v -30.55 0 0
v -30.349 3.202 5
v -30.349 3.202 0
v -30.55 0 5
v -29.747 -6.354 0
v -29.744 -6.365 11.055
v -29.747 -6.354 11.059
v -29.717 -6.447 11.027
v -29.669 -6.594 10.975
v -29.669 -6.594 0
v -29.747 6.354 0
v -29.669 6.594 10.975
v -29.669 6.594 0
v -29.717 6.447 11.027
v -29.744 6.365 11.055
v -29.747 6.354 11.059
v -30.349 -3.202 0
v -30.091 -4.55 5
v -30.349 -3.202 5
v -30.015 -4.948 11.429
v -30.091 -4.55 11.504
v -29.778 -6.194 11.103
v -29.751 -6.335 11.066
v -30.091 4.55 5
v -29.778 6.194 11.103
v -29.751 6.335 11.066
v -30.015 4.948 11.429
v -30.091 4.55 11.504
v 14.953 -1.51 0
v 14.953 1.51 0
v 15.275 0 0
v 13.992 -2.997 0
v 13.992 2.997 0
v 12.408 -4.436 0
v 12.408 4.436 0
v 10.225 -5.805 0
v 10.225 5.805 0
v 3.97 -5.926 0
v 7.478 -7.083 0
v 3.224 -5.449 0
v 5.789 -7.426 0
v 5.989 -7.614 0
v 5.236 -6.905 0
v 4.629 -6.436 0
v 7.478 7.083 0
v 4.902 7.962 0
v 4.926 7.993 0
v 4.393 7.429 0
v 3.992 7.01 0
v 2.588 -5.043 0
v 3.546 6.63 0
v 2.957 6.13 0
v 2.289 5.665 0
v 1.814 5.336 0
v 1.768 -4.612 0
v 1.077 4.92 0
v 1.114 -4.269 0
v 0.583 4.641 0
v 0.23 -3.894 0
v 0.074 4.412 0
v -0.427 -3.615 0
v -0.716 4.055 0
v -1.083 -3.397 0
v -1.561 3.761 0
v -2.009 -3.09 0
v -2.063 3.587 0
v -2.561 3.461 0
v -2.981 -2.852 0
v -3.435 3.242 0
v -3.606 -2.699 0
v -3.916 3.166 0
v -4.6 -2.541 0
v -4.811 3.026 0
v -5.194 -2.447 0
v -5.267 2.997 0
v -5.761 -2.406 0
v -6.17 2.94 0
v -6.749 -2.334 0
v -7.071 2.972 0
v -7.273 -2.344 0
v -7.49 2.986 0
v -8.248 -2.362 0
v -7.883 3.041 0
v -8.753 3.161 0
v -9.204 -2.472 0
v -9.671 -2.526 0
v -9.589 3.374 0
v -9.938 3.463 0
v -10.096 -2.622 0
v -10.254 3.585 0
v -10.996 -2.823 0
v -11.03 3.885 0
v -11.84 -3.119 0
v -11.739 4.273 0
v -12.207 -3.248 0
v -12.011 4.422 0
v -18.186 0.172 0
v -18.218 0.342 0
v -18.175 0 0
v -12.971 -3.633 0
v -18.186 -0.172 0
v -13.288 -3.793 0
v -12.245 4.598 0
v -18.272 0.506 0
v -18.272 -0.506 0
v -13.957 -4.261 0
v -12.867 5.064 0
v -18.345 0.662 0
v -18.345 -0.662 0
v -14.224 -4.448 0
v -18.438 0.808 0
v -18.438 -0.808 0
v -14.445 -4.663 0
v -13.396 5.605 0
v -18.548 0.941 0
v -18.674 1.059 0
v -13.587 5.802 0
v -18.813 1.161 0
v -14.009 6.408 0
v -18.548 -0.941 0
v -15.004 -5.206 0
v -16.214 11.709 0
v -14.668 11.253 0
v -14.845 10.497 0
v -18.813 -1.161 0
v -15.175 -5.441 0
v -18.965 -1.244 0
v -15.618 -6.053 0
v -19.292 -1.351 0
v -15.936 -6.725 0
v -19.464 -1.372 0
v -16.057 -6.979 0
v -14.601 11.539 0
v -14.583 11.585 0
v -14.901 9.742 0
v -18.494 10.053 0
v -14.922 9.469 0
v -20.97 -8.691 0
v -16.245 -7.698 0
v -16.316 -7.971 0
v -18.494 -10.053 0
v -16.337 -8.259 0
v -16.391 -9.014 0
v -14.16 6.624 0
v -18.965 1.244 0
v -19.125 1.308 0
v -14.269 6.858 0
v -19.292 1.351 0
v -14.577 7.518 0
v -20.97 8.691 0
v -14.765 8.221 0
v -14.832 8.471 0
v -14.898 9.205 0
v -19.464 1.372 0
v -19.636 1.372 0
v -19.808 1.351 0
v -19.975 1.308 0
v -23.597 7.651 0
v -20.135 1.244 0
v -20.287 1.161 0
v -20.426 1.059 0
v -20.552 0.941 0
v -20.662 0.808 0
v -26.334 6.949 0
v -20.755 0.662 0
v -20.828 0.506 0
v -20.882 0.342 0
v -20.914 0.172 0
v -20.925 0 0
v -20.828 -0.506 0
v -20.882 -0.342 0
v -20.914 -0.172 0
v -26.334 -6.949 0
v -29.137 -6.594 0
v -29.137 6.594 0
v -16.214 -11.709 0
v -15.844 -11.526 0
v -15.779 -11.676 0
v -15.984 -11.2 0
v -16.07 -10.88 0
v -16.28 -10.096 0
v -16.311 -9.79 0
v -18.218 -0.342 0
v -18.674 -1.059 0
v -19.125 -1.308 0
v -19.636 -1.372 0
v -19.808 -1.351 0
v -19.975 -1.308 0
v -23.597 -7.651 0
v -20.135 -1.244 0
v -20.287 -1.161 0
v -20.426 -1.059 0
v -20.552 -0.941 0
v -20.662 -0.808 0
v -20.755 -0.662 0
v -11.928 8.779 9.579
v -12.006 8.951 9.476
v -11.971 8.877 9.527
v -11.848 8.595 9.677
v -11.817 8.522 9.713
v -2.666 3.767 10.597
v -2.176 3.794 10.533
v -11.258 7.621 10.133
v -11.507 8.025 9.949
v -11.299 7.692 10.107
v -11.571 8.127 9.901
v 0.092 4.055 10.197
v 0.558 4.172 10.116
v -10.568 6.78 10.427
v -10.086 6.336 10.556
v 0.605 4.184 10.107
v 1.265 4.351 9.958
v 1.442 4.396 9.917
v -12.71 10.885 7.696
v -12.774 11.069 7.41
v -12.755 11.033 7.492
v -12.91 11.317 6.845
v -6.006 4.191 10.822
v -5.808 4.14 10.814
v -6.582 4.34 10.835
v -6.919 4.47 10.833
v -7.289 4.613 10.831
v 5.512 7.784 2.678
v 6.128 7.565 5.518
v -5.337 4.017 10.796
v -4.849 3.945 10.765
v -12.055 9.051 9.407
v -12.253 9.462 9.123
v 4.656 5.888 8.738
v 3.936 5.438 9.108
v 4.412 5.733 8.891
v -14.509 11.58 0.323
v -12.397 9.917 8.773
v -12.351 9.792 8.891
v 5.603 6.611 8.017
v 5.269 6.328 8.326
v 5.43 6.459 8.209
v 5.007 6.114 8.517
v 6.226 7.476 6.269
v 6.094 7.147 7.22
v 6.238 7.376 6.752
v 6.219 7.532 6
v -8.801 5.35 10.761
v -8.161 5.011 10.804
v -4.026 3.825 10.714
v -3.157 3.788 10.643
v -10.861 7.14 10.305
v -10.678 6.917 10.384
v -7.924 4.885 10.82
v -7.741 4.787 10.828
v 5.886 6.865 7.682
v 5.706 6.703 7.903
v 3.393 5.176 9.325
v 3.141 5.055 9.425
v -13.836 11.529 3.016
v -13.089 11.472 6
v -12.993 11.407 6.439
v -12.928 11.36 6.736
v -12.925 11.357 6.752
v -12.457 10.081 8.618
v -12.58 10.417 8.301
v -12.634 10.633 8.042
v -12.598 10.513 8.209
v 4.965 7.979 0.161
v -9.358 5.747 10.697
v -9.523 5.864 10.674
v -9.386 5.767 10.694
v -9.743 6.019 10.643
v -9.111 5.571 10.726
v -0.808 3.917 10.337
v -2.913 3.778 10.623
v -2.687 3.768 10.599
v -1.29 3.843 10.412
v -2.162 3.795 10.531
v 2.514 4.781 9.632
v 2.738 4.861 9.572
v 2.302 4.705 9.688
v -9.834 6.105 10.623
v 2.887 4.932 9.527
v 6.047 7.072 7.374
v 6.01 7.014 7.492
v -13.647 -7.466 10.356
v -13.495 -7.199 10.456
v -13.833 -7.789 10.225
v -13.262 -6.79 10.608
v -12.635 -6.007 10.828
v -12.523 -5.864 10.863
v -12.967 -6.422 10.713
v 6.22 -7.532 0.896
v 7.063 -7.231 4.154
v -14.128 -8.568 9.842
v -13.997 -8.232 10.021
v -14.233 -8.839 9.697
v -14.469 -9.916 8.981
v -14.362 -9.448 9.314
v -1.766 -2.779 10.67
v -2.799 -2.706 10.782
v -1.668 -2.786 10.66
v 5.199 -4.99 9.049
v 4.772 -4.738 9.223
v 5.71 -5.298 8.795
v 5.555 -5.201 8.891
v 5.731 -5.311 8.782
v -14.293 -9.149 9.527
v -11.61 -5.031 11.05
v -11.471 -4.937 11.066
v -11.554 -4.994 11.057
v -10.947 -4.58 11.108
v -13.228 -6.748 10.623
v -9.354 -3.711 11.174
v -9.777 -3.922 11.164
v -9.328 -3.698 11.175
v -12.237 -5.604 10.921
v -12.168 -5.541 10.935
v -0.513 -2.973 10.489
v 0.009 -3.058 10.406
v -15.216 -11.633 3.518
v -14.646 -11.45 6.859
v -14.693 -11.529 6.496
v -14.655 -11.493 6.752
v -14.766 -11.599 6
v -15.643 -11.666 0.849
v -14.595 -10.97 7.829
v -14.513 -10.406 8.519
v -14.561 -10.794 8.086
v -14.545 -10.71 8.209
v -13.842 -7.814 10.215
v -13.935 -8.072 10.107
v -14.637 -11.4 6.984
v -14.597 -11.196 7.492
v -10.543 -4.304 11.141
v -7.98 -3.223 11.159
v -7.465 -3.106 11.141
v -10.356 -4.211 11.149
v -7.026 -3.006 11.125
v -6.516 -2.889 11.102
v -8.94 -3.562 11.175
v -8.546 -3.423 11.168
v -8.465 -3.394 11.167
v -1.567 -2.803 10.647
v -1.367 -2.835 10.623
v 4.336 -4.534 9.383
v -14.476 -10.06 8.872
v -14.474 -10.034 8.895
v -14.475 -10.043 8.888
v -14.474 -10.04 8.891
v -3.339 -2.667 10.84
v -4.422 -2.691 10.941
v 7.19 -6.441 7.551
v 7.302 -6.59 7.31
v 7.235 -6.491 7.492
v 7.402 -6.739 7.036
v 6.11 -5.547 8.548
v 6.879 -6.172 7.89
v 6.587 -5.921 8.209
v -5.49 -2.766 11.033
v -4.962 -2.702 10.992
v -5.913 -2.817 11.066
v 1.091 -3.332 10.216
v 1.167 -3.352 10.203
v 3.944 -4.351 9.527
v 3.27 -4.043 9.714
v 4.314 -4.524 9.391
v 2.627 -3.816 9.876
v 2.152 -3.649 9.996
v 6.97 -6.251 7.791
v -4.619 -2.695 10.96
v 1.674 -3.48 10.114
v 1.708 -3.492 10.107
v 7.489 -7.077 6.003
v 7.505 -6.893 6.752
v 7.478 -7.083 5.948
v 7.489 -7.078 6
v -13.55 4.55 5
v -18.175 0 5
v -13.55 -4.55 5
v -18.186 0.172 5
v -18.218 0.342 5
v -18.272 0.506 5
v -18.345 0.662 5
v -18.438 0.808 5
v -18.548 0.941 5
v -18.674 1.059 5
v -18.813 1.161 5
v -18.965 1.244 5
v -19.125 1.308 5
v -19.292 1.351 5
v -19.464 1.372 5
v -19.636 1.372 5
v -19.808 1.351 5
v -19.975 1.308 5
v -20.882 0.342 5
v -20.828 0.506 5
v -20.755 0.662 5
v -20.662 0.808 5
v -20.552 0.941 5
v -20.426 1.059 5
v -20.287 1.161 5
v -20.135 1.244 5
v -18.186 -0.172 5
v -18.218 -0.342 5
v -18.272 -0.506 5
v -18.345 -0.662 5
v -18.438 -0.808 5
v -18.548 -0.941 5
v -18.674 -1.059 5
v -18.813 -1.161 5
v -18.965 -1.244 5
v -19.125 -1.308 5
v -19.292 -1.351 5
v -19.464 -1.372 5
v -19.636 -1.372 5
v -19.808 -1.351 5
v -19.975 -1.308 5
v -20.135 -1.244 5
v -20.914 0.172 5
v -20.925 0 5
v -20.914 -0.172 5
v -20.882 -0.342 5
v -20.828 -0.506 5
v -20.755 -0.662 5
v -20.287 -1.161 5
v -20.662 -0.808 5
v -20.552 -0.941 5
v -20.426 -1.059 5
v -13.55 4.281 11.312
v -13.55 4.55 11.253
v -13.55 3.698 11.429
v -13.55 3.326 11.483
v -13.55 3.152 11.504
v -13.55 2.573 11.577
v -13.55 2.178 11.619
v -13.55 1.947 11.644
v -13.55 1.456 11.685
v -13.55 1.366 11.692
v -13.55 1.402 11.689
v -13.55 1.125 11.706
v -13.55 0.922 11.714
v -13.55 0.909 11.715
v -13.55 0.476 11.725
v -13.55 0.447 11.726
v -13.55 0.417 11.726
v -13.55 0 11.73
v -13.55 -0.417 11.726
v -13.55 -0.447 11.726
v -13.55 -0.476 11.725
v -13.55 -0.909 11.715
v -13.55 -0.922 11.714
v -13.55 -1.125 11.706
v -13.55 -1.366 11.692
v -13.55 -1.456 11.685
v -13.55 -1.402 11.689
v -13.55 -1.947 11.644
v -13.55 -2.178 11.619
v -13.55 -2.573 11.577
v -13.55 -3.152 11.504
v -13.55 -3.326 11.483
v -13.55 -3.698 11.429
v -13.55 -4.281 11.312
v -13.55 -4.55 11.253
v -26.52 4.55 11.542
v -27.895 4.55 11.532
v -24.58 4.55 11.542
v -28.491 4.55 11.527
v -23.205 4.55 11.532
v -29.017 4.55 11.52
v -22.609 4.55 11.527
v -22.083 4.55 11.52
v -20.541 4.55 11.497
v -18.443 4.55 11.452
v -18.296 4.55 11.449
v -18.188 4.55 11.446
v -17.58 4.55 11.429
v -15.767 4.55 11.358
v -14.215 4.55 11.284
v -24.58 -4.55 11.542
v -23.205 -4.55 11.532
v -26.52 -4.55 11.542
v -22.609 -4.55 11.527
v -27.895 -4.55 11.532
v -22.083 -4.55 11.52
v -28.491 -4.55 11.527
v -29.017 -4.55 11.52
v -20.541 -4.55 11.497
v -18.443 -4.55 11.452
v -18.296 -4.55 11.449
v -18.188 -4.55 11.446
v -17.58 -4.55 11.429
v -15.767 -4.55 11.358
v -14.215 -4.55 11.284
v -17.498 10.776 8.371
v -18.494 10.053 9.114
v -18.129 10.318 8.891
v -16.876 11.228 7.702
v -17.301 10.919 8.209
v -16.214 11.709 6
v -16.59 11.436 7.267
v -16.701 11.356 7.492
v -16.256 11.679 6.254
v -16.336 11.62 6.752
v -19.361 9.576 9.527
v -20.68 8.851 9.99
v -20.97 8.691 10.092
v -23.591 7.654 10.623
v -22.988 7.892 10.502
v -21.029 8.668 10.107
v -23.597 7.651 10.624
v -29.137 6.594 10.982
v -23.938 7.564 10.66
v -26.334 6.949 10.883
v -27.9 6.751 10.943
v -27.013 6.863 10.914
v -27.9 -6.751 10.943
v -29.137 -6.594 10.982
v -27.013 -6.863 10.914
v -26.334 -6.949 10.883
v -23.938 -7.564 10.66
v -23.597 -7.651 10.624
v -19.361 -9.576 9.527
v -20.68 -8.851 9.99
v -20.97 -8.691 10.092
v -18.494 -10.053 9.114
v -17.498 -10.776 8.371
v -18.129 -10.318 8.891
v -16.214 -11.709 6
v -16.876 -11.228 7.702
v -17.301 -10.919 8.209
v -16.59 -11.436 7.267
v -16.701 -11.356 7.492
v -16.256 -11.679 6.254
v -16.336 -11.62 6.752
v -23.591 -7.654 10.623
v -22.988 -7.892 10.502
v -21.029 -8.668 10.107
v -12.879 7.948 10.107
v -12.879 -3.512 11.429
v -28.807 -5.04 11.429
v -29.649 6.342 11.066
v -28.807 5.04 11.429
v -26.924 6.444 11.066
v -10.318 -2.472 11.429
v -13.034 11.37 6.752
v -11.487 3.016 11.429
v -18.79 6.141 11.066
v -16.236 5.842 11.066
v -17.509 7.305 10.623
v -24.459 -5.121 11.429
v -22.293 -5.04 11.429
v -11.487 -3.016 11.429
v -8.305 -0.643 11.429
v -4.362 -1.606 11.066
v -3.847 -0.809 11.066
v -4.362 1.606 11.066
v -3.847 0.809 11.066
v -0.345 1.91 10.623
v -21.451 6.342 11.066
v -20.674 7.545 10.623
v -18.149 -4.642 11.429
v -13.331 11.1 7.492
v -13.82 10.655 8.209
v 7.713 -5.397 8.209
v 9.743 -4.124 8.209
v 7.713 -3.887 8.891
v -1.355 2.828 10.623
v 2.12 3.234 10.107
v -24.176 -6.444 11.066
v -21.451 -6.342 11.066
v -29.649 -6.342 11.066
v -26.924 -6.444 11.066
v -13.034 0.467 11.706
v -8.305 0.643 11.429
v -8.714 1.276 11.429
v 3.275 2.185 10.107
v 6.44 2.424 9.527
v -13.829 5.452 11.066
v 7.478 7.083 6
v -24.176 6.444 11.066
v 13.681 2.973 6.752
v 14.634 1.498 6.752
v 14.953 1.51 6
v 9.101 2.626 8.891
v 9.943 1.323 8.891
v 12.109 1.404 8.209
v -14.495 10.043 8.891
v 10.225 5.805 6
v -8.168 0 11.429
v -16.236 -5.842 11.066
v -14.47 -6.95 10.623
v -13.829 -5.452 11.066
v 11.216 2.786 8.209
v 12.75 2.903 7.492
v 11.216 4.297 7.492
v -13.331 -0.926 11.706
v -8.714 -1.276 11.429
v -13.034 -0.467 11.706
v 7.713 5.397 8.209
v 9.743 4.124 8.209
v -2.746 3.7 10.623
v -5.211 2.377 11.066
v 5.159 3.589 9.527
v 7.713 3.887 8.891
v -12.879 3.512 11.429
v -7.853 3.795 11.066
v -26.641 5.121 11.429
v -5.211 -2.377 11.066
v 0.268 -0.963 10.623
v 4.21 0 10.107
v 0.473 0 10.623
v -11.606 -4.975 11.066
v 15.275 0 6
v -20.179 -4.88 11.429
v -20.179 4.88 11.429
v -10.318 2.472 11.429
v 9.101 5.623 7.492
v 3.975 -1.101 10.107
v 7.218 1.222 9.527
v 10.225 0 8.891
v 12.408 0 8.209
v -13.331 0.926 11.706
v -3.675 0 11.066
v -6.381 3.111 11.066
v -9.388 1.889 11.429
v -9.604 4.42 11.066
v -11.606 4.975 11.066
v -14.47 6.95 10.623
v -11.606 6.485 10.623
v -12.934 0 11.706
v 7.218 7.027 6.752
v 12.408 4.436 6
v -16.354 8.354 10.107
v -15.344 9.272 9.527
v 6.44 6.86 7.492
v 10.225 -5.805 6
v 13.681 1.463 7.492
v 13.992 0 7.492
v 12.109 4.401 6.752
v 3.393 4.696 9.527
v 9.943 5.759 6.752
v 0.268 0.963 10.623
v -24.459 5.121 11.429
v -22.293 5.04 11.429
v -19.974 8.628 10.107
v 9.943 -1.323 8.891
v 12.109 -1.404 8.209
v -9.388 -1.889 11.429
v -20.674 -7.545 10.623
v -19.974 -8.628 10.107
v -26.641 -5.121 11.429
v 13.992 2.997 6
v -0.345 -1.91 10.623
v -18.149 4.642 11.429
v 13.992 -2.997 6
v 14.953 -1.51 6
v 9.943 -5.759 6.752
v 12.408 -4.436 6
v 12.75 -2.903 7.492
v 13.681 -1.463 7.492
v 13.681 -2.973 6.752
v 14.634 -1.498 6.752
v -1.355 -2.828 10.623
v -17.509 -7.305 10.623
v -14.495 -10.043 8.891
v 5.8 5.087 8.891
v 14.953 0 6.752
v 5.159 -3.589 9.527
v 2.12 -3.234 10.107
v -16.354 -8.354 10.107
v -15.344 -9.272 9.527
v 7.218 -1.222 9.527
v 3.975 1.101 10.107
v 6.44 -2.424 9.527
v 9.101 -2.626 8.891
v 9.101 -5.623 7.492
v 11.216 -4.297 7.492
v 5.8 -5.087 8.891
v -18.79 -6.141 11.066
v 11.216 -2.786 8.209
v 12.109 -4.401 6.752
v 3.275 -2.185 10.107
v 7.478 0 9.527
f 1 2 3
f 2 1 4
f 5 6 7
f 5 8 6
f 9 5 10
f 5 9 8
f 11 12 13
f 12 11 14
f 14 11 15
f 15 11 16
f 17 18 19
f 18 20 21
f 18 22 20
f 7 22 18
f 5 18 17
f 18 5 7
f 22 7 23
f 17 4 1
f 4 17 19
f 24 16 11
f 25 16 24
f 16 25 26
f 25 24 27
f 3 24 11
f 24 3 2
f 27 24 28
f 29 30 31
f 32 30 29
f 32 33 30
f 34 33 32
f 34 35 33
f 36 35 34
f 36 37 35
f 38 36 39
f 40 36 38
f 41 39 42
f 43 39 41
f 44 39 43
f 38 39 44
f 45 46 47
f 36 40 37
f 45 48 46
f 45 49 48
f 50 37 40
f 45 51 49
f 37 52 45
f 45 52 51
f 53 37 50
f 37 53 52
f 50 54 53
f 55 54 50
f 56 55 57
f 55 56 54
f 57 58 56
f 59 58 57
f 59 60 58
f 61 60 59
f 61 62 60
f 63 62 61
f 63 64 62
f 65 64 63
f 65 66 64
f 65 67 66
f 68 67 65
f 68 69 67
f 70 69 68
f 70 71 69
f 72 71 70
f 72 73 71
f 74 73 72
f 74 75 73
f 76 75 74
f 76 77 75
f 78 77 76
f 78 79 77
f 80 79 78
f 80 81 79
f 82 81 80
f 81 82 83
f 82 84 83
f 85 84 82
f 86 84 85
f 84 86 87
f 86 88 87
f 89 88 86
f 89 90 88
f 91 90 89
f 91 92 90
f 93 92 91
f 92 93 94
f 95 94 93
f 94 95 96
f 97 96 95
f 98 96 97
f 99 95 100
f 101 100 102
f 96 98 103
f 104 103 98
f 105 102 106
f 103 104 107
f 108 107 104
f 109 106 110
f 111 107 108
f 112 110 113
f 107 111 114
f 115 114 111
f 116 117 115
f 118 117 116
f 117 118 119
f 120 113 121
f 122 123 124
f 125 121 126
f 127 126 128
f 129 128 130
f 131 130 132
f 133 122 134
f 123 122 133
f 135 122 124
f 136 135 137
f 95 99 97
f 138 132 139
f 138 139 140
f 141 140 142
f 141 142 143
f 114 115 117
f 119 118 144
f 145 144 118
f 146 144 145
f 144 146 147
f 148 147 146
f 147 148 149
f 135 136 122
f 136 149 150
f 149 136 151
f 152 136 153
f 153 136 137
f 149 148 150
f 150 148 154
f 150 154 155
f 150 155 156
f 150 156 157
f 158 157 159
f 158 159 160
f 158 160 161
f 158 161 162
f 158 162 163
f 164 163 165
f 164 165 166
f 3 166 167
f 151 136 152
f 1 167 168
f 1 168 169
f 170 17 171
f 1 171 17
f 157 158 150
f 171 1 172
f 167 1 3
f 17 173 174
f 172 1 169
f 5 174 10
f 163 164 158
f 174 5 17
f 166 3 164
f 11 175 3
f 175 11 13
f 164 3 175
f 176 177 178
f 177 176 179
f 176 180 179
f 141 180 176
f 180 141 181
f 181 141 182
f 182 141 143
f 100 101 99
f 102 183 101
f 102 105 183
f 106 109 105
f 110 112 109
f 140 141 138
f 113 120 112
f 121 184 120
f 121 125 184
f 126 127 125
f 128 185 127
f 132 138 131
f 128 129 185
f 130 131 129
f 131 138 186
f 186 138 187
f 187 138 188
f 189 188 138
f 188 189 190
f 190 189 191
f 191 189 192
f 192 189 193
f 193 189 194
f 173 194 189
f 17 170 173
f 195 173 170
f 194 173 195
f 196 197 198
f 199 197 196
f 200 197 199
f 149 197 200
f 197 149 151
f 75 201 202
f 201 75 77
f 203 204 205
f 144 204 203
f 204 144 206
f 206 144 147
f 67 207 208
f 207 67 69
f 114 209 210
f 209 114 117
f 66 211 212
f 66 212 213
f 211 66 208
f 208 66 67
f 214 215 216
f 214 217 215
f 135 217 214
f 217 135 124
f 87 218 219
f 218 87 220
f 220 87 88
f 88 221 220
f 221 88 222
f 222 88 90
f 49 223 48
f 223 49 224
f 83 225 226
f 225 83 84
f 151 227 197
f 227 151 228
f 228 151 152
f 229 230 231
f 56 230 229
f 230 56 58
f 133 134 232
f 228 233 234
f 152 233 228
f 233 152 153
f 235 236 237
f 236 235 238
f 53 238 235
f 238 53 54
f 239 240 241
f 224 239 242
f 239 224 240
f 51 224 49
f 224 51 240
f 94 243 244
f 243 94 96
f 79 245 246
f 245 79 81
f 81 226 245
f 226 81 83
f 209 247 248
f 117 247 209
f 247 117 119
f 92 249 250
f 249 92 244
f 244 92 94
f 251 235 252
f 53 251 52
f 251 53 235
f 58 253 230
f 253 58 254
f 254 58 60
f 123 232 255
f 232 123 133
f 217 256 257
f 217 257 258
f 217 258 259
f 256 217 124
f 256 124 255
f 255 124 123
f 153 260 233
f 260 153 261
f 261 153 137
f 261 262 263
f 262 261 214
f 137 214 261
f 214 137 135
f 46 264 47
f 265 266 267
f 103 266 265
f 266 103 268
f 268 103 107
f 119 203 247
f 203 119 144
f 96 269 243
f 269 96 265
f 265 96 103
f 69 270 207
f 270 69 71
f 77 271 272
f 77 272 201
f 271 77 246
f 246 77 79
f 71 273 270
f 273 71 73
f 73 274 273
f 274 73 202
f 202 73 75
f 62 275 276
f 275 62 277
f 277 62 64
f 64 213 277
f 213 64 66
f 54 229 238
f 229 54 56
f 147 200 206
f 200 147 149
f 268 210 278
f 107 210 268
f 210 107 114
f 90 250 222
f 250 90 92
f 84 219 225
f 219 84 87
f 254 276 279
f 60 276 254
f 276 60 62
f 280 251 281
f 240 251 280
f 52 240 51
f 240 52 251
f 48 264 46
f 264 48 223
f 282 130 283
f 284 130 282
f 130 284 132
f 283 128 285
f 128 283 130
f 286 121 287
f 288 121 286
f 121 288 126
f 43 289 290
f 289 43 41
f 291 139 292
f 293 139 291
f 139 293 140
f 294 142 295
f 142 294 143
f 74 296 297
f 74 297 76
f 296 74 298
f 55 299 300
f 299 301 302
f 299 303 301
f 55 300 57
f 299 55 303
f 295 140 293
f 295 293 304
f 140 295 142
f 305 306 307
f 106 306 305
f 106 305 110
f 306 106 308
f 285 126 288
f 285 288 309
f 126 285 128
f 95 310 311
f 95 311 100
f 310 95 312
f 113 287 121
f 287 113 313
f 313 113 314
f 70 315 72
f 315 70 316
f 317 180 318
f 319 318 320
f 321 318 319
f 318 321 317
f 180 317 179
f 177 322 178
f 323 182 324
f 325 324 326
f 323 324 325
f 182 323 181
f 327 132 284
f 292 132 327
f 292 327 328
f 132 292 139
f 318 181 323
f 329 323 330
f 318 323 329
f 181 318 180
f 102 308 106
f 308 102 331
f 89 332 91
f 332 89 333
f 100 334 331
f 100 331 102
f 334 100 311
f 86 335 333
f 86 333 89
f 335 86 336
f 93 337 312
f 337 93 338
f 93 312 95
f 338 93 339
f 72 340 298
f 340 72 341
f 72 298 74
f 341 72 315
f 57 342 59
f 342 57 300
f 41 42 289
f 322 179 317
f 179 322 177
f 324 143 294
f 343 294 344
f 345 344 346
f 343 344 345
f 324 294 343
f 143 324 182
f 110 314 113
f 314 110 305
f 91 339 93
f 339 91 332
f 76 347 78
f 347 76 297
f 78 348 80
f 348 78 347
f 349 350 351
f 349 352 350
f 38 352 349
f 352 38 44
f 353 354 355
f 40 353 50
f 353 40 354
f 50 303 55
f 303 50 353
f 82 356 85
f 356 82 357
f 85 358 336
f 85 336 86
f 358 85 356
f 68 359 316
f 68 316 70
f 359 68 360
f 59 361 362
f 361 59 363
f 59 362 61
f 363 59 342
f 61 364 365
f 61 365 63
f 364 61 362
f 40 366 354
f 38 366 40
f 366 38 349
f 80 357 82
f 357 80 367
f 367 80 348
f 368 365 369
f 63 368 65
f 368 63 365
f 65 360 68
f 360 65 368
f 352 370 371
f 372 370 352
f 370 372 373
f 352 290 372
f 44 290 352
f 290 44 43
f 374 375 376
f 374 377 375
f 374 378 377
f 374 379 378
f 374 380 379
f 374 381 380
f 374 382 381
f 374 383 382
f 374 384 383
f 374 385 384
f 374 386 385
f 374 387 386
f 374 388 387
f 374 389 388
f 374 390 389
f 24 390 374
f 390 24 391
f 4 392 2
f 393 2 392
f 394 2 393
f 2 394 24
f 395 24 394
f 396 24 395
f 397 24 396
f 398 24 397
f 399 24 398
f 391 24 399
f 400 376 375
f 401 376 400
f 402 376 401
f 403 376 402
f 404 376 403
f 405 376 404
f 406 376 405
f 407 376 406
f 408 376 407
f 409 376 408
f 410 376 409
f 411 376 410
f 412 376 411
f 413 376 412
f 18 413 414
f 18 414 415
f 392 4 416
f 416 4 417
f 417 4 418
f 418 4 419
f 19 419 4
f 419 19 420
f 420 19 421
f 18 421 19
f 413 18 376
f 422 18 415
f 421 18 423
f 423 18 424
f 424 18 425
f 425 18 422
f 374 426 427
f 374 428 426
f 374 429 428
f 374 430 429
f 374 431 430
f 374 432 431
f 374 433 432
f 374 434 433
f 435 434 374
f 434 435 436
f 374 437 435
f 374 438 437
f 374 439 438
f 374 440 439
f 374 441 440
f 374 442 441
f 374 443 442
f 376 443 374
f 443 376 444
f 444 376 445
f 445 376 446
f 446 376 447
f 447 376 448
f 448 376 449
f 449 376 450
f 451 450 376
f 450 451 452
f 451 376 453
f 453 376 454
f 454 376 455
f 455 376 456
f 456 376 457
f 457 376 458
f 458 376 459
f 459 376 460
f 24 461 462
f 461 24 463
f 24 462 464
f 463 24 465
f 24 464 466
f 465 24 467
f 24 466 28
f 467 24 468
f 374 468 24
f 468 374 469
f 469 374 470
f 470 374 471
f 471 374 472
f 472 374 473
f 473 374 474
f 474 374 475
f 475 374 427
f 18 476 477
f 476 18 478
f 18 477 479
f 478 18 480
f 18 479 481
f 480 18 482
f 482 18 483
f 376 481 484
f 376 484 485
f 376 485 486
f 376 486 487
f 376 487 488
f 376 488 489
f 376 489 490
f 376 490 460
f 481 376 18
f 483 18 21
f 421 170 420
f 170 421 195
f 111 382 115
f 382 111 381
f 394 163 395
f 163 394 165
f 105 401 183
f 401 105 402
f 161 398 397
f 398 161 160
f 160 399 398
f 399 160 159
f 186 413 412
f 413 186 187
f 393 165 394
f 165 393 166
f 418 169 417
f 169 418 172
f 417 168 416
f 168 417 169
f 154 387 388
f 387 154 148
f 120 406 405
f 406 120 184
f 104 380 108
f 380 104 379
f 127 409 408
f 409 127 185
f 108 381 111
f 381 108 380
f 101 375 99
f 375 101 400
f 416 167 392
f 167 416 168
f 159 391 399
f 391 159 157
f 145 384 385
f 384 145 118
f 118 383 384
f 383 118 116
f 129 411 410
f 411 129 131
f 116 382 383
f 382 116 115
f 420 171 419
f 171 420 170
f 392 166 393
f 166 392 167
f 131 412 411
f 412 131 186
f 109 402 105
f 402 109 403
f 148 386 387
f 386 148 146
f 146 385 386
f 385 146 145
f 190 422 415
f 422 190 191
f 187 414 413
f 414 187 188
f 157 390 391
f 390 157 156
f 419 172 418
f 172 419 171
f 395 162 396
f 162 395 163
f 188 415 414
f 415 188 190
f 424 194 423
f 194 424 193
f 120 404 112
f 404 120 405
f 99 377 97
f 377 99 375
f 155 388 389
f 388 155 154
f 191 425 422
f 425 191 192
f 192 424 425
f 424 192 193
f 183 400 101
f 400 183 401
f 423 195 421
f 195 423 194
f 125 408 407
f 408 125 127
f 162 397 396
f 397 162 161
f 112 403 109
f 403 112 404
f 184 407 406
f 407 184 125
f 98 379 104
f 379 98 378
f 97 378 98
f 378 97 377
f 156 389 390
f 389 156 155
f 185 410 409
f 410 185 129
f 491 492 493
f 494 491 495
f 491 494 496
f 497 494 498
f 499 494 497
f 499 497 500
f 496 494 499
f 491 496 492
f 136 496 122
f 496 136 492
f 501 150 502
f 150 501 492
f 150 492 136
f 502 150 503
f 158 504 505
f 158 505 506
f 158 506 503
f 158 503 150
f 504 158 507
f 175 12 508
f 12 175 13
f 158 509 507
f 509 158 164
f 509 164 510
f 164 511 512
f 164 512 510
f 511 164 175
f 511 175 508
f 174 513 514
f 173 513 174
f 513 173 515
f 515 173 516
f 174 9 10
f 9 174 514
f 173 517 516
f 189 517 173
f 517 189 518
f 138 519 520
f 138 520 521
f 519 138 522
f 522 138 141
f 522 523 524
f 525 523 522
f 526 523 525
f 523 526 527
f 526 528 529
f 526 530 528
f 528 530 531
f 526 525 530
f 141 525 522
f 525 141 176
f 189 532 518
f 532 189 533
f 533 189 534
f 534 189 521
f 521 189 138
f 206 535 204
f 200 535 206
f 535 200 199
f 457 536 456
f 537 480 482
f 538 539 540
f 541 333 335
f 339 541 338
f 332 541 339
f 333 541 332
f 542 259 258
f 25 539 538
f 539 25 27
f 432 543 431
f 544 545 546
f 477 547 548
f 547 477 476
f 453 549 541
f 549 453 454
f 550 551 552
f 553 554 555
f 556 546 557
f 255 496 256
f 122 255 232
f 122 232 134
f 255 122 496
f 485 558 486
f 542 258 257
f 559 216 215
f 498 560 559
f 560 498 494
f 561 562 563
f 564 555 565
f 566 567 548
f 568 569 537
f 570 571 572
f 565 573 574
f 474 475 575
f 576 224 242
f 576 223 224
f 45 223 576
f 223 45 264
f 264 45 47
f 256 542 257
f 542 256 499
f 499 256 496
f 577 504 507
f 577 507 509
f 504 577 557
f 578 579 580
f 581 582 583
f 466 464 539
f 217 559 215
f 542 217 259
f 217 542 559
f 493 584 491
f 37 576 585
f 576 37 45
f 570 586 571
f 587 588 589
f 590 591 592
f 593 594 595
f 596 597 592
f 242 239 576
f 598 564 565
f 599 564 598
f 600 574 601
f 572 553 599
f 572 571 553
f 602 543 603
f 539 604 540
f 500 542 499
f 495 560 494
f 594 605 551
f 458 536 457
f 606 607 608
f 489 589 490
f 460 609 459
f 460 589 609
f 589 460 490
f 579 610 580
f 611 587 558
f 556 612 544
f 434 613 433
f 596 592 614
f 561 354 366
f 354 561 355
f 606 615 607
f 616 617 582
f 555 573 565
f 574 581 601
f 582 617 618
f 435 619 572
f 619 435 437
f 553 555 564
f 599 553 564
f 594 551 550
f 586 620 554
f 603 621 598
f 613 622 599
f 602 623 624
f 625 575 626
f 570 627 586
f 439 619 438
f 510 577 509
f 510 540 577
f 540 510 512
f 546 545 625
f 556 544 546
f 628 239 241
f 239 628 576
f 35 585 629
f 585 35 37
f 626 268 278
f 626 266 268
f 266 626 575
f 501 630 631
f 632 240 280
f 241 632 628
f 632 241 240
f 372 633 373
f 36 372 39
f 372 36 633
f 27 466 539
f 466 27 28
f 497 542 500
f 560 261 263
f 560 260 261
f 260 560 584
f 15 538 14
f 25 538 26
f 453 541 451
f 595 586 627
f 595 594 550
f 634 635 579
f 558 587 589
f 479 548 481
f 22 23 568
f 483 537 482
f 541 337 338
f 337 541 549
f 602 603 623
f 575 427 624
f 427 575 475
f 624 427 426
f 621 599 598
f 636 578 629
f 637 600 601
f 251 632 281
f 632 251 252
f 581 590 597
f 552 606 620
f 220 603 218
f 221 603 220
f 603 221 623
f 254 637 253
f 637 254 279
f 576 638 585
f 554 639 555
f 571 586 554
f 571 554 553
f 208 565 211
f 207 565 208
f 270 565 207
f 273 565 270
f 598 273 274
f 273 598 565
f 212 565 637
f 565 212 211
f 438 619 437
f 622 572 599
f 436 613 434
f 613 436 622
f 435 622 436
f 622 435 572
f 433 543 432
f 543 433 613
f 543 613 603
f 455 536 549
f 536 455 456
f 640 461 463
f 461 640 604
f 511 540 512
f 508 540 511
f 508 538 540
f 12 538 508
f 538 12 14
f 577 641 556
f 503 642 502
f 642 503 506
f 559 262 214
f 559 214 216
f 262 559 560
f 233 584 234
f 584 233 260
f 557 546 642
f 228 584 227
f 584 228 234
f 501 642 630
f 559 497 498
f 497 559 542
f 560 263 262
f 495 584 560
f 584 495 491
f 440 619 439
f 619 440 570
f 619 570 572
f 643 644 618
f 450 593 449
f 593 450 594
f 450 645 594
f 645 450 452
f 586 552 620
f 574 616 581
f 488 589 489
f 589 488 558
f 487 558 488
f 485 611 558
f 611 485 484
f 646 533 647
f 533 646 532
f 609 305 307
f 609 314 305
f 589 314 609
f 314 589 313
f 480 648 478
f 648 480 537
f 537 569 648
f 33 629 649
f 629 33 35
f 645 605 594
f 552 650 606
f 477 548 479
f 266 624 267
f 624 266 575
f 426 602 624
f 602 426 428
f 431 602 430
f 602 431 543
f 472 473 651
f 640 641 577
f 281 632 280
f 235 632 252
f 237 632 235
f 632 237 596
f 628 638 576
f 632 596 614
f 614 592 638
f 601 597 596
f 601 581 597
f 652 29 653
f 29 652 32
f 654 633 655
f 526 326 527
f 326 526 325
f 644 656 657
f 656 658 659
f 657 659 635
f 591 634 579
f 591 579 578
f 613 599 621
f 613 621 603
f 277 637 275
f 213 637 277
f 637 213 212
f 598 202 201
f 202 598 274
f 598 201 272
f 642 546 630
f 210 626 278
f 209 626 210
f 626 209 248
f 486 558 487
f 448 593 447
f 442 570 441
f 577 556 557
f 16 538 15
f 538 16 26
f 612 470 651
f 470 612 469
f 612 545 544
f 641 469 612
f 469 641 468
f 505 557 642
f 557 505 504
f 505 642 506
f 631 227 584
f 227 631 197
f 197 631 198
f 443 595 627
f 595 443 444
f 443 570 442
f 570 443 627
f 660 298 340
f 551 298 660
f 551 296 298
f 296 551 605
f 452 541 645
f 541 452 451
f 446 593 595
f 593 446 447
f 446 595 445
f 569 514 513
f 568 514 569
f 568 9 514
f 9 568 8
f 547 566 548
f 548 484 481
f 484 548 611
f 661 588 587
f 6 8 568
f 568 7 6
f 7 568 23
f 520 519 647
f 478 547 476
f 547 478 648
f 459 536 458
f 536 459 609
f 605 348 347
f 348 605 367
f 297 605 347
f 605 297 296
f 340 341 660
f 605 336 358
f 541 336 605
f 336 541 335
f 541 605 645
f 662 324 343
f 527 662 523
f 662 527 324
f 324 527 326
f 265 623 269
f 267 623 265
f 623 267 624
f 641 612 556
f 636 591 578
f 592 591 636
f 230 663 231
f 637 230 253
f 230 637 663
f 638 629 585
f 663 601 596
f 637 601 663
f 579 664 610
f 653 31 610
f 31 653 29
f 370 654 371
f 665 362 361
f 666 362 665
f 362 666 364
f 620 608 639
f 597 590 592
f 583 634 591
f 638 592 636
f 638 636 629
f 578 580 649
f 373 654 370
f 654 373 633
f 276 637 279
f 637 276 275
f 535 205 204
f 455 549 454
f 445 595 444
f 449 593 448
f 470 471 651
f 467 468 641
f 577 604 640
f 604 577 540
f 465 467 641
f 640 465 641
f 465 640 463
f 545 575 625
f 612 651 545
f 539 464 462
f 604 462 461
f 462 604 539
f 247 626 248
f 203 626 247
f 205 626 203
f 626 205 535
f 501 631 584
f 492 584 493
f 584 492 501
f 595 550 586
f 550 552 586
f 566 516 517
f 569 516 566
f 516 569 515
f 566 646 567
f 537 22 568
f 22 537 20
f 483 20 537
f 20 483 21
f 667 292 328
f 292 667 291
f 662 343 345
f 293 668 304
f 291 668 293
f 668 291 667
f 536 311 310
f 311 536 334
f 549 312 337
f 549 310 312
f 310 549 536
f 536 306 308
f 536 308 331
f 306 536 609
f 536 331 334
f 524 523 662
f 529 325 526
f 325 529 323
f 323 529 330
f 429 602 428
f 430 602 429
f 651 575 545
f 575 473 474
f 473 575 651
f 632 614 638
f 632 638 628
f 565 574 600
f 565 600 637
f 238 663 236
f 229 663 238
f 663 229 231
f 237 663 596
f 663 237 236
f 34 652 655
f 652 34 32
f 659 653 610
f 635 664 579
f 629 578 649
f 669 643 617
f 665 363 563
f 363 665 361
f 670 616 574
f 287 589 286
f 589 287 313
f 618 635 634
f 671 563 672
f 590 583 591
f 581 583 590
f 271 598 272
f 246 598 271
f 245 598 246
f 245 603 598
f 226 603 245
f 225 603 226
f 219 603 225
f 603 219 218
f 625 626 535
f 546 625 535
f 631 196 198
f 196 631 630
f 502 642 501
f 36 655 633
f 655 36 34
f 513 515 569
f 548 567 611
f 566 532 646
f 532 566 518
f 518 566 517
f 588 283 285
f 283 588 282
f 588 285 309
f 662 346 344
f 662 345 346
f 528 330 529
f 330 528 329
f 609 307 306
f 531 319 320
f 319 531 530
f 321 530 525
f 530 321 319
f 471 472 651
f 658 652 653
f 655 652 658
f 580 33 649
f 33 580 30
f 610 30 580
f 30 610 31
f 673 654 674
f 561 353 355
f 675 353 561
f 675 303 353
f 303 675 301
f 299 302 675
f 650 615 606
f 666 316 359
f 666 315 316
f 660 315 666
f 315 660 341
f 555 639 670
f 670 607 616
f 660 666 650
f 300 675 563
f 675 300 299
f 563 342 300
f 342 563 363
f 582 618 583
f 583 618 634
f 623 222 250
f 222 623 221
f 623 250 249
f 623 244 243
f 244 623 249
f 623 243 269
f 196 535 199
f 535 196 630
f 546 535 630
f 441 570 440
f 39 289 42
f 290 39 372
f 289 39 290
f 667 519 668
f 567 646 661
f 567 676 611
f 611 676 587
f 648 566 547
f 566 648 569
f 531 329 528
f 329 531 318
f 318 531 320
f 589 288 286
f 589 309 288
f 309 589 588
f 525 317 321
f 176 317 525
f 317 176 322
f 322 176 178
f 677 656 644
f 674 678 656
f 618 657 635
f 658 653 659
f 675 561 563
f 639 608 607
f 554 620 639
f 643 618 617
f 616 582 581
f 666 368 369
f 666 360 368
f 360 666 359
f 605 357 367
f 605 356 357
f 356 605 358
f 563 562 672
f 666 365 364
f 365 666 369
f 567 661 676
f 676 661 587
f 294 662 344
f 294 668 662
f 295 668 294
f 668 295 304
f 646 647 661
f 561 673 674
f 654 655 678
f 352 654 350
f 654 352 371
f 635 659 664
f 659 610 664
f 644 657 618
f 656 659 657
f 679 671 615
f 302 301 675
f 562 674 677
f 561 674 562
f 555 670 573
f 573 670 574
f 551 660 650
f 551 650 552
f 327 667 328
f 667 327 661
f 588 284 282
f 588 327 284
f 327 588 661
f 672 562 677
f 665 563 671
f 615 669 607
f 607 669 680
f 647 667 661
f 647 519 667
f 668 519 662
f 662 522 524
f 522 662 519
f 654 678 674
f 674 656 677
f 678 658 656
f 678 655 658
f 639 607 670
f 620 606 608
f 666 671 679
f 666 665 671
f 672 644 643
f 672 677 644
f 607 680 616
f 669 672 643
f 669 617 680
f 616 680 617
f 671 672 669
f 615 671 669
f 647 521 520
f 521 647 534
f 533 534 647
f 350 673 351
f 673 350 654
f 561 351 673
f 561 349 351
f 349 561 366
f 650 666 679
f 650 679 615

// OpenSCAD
// right angle X-Acto blade holder

rightHanded=true;

small=false;

wallThickness=2;

holderThickness=12;

bladeRecessBottomHeight=5;  // from bottom surface (enough room for screw head and enough for screw threads to hold)

// Small x-acto blade
bladeRecessWidth=(small) ? 6.1 : 9.1;  // root width of exacto blade (slightly larger)
bladeRecessLength=(small) ? 12 : 17; // from right side (root length of xacto blade)
bladeMountHoleInset=(small) ? 7 : 11; // closer to root end of elongated slot, to prevent slide-out

bladeMountHoleDia=2.75;
bladeMountScrewHeadDia=7;

fingerHoleMajorDia=20;
fingerHoleMinorDia=15;
fingerHoleMinorAxisScale=fingerHoleMinorDia/fingerHoleMajorDia;
fingerHoleYRotation=-20;
fingerHoleZRotation=-20;
fingerHoleOutTaperFactor=1.2;

thumbHoleMajorDia=22;
thumbHoleMinorDia=15;
thumbHoleMinorAxisScale=thumbHoleMinorDia/thumbHoleMajorDia;
thumbHoleYRotation=-20;
thumbHoleZRotation=20;
thumbHoleOutTaperFactor=1.4;

holderBodyDia=thumbHoleMajorDia+fingerHoleMajorDia+bladeRecessWidth;
holderBodyElongation=5;
handleEndFlatteningFactor=0.85;

approachCutoutDia=45;

overlap=0.01;
$fn=50;

holderWithHandedness();

module holderWithHandedness() {
    if (rightHanded) {
        mirror([1,0,0]) holder();
    } else {
        holder();
    }
}

module holder() {
    bodyXDimension=holderBodyDia*1.5+holderBodyElongation;
    clippingSphereXScale=bodyXDimension/holderThickness;
    clippingSphereYScale=(bladeRecessWidth+fingerHoleMinorDia/2+thumbHoleMinorDia/2)/holderThickness;
    intersection() {
        // Bounding flat-bottomed sphere (dome) that clips off the full finger-hole sides
        translate([holderBodyDia/2,0,0])
            hull() {
                scale([clippingSphereXScale,clippingSphereYScale,1])
                    translate([0,0,holderThickness/2])
                        sphere(d=holderThickness);
                scale([clippingSphereXScale,clippingSphereYScale,1]) 
                    cylinder(d=holderThickness, h=overlap);
            }
        difference() {
            // body
            hull() { 
                scale([handleEndFlatteningFactor,1,1])
                    cylinder(d=holderBodyDia, h=holderThickness);
                translate([holderBodyElongation,0,0])
                    cylinder(d=holderBodyDia, h=holderThickness);
            }

            // finger hole
            rotate([0,fingerHoleYRotation,fingerHoleZRotation])
                translate([0,bladeRecessWidth/2+fingerHoleMinorDia/2,-holderThickness])
                    scale([1,fingerHoleMinorAxisScale,1])
                        cylinder(d1=fingerHoleMajorDia, d2=fingerHoleMajorDia*fingerHoleOutTaperFactor ,h=holderThickness*3);

            // thumb hole
            rotate([0,thumbHoleYRotation,thumbHoleZRotation])
                translate([0,-bladeRecessWidth/2-thumbHoleMinorDia/2,-holderThickness])
                    scale([1,thumbHoleMinorAxisScale,1])
                        cylinder(d1=thumbHoleMajorDia, d2=thumbHoleMajorDia*thumbHoleOutTaperFactor ,h=holderThickness*3);

            // blade recess
            translate([holderBodyElongation+holderBodyDia/2-bladeRecessLength,-bladeRecessWidth/2,bladeRecessBottomHeight])
                cube([bladeRecessLength+overlap,bladeRecessWidth,holderThickness-bladeRecessBottomHeight+overlap]);
            translate([holderBodyElongation+holderBodyDia/2-bladeMountHoleInset,0,-overlap])
                cylinder(d=bladeMountHoleDia, h=holderThickness+overlap*2);       

            // approach cutouts
            translate([holderBodyElongation+holderBodyDia/2,approachCutoutDia/2+bladeRecessWidth/2+wallThickness,-overlap])
                cylinder(d=approachCutoutDia, h=holderThickness+overlap*2);
            translate([holderBodyElongation+holderBodyDia/2,-approachCutoutDia/2-bladeRecessWidth/2-wallThickness,-overlap])
                cylinder(d=approachCutoutDia, h=holderThickness+overlap*2);
        }
    }
}
